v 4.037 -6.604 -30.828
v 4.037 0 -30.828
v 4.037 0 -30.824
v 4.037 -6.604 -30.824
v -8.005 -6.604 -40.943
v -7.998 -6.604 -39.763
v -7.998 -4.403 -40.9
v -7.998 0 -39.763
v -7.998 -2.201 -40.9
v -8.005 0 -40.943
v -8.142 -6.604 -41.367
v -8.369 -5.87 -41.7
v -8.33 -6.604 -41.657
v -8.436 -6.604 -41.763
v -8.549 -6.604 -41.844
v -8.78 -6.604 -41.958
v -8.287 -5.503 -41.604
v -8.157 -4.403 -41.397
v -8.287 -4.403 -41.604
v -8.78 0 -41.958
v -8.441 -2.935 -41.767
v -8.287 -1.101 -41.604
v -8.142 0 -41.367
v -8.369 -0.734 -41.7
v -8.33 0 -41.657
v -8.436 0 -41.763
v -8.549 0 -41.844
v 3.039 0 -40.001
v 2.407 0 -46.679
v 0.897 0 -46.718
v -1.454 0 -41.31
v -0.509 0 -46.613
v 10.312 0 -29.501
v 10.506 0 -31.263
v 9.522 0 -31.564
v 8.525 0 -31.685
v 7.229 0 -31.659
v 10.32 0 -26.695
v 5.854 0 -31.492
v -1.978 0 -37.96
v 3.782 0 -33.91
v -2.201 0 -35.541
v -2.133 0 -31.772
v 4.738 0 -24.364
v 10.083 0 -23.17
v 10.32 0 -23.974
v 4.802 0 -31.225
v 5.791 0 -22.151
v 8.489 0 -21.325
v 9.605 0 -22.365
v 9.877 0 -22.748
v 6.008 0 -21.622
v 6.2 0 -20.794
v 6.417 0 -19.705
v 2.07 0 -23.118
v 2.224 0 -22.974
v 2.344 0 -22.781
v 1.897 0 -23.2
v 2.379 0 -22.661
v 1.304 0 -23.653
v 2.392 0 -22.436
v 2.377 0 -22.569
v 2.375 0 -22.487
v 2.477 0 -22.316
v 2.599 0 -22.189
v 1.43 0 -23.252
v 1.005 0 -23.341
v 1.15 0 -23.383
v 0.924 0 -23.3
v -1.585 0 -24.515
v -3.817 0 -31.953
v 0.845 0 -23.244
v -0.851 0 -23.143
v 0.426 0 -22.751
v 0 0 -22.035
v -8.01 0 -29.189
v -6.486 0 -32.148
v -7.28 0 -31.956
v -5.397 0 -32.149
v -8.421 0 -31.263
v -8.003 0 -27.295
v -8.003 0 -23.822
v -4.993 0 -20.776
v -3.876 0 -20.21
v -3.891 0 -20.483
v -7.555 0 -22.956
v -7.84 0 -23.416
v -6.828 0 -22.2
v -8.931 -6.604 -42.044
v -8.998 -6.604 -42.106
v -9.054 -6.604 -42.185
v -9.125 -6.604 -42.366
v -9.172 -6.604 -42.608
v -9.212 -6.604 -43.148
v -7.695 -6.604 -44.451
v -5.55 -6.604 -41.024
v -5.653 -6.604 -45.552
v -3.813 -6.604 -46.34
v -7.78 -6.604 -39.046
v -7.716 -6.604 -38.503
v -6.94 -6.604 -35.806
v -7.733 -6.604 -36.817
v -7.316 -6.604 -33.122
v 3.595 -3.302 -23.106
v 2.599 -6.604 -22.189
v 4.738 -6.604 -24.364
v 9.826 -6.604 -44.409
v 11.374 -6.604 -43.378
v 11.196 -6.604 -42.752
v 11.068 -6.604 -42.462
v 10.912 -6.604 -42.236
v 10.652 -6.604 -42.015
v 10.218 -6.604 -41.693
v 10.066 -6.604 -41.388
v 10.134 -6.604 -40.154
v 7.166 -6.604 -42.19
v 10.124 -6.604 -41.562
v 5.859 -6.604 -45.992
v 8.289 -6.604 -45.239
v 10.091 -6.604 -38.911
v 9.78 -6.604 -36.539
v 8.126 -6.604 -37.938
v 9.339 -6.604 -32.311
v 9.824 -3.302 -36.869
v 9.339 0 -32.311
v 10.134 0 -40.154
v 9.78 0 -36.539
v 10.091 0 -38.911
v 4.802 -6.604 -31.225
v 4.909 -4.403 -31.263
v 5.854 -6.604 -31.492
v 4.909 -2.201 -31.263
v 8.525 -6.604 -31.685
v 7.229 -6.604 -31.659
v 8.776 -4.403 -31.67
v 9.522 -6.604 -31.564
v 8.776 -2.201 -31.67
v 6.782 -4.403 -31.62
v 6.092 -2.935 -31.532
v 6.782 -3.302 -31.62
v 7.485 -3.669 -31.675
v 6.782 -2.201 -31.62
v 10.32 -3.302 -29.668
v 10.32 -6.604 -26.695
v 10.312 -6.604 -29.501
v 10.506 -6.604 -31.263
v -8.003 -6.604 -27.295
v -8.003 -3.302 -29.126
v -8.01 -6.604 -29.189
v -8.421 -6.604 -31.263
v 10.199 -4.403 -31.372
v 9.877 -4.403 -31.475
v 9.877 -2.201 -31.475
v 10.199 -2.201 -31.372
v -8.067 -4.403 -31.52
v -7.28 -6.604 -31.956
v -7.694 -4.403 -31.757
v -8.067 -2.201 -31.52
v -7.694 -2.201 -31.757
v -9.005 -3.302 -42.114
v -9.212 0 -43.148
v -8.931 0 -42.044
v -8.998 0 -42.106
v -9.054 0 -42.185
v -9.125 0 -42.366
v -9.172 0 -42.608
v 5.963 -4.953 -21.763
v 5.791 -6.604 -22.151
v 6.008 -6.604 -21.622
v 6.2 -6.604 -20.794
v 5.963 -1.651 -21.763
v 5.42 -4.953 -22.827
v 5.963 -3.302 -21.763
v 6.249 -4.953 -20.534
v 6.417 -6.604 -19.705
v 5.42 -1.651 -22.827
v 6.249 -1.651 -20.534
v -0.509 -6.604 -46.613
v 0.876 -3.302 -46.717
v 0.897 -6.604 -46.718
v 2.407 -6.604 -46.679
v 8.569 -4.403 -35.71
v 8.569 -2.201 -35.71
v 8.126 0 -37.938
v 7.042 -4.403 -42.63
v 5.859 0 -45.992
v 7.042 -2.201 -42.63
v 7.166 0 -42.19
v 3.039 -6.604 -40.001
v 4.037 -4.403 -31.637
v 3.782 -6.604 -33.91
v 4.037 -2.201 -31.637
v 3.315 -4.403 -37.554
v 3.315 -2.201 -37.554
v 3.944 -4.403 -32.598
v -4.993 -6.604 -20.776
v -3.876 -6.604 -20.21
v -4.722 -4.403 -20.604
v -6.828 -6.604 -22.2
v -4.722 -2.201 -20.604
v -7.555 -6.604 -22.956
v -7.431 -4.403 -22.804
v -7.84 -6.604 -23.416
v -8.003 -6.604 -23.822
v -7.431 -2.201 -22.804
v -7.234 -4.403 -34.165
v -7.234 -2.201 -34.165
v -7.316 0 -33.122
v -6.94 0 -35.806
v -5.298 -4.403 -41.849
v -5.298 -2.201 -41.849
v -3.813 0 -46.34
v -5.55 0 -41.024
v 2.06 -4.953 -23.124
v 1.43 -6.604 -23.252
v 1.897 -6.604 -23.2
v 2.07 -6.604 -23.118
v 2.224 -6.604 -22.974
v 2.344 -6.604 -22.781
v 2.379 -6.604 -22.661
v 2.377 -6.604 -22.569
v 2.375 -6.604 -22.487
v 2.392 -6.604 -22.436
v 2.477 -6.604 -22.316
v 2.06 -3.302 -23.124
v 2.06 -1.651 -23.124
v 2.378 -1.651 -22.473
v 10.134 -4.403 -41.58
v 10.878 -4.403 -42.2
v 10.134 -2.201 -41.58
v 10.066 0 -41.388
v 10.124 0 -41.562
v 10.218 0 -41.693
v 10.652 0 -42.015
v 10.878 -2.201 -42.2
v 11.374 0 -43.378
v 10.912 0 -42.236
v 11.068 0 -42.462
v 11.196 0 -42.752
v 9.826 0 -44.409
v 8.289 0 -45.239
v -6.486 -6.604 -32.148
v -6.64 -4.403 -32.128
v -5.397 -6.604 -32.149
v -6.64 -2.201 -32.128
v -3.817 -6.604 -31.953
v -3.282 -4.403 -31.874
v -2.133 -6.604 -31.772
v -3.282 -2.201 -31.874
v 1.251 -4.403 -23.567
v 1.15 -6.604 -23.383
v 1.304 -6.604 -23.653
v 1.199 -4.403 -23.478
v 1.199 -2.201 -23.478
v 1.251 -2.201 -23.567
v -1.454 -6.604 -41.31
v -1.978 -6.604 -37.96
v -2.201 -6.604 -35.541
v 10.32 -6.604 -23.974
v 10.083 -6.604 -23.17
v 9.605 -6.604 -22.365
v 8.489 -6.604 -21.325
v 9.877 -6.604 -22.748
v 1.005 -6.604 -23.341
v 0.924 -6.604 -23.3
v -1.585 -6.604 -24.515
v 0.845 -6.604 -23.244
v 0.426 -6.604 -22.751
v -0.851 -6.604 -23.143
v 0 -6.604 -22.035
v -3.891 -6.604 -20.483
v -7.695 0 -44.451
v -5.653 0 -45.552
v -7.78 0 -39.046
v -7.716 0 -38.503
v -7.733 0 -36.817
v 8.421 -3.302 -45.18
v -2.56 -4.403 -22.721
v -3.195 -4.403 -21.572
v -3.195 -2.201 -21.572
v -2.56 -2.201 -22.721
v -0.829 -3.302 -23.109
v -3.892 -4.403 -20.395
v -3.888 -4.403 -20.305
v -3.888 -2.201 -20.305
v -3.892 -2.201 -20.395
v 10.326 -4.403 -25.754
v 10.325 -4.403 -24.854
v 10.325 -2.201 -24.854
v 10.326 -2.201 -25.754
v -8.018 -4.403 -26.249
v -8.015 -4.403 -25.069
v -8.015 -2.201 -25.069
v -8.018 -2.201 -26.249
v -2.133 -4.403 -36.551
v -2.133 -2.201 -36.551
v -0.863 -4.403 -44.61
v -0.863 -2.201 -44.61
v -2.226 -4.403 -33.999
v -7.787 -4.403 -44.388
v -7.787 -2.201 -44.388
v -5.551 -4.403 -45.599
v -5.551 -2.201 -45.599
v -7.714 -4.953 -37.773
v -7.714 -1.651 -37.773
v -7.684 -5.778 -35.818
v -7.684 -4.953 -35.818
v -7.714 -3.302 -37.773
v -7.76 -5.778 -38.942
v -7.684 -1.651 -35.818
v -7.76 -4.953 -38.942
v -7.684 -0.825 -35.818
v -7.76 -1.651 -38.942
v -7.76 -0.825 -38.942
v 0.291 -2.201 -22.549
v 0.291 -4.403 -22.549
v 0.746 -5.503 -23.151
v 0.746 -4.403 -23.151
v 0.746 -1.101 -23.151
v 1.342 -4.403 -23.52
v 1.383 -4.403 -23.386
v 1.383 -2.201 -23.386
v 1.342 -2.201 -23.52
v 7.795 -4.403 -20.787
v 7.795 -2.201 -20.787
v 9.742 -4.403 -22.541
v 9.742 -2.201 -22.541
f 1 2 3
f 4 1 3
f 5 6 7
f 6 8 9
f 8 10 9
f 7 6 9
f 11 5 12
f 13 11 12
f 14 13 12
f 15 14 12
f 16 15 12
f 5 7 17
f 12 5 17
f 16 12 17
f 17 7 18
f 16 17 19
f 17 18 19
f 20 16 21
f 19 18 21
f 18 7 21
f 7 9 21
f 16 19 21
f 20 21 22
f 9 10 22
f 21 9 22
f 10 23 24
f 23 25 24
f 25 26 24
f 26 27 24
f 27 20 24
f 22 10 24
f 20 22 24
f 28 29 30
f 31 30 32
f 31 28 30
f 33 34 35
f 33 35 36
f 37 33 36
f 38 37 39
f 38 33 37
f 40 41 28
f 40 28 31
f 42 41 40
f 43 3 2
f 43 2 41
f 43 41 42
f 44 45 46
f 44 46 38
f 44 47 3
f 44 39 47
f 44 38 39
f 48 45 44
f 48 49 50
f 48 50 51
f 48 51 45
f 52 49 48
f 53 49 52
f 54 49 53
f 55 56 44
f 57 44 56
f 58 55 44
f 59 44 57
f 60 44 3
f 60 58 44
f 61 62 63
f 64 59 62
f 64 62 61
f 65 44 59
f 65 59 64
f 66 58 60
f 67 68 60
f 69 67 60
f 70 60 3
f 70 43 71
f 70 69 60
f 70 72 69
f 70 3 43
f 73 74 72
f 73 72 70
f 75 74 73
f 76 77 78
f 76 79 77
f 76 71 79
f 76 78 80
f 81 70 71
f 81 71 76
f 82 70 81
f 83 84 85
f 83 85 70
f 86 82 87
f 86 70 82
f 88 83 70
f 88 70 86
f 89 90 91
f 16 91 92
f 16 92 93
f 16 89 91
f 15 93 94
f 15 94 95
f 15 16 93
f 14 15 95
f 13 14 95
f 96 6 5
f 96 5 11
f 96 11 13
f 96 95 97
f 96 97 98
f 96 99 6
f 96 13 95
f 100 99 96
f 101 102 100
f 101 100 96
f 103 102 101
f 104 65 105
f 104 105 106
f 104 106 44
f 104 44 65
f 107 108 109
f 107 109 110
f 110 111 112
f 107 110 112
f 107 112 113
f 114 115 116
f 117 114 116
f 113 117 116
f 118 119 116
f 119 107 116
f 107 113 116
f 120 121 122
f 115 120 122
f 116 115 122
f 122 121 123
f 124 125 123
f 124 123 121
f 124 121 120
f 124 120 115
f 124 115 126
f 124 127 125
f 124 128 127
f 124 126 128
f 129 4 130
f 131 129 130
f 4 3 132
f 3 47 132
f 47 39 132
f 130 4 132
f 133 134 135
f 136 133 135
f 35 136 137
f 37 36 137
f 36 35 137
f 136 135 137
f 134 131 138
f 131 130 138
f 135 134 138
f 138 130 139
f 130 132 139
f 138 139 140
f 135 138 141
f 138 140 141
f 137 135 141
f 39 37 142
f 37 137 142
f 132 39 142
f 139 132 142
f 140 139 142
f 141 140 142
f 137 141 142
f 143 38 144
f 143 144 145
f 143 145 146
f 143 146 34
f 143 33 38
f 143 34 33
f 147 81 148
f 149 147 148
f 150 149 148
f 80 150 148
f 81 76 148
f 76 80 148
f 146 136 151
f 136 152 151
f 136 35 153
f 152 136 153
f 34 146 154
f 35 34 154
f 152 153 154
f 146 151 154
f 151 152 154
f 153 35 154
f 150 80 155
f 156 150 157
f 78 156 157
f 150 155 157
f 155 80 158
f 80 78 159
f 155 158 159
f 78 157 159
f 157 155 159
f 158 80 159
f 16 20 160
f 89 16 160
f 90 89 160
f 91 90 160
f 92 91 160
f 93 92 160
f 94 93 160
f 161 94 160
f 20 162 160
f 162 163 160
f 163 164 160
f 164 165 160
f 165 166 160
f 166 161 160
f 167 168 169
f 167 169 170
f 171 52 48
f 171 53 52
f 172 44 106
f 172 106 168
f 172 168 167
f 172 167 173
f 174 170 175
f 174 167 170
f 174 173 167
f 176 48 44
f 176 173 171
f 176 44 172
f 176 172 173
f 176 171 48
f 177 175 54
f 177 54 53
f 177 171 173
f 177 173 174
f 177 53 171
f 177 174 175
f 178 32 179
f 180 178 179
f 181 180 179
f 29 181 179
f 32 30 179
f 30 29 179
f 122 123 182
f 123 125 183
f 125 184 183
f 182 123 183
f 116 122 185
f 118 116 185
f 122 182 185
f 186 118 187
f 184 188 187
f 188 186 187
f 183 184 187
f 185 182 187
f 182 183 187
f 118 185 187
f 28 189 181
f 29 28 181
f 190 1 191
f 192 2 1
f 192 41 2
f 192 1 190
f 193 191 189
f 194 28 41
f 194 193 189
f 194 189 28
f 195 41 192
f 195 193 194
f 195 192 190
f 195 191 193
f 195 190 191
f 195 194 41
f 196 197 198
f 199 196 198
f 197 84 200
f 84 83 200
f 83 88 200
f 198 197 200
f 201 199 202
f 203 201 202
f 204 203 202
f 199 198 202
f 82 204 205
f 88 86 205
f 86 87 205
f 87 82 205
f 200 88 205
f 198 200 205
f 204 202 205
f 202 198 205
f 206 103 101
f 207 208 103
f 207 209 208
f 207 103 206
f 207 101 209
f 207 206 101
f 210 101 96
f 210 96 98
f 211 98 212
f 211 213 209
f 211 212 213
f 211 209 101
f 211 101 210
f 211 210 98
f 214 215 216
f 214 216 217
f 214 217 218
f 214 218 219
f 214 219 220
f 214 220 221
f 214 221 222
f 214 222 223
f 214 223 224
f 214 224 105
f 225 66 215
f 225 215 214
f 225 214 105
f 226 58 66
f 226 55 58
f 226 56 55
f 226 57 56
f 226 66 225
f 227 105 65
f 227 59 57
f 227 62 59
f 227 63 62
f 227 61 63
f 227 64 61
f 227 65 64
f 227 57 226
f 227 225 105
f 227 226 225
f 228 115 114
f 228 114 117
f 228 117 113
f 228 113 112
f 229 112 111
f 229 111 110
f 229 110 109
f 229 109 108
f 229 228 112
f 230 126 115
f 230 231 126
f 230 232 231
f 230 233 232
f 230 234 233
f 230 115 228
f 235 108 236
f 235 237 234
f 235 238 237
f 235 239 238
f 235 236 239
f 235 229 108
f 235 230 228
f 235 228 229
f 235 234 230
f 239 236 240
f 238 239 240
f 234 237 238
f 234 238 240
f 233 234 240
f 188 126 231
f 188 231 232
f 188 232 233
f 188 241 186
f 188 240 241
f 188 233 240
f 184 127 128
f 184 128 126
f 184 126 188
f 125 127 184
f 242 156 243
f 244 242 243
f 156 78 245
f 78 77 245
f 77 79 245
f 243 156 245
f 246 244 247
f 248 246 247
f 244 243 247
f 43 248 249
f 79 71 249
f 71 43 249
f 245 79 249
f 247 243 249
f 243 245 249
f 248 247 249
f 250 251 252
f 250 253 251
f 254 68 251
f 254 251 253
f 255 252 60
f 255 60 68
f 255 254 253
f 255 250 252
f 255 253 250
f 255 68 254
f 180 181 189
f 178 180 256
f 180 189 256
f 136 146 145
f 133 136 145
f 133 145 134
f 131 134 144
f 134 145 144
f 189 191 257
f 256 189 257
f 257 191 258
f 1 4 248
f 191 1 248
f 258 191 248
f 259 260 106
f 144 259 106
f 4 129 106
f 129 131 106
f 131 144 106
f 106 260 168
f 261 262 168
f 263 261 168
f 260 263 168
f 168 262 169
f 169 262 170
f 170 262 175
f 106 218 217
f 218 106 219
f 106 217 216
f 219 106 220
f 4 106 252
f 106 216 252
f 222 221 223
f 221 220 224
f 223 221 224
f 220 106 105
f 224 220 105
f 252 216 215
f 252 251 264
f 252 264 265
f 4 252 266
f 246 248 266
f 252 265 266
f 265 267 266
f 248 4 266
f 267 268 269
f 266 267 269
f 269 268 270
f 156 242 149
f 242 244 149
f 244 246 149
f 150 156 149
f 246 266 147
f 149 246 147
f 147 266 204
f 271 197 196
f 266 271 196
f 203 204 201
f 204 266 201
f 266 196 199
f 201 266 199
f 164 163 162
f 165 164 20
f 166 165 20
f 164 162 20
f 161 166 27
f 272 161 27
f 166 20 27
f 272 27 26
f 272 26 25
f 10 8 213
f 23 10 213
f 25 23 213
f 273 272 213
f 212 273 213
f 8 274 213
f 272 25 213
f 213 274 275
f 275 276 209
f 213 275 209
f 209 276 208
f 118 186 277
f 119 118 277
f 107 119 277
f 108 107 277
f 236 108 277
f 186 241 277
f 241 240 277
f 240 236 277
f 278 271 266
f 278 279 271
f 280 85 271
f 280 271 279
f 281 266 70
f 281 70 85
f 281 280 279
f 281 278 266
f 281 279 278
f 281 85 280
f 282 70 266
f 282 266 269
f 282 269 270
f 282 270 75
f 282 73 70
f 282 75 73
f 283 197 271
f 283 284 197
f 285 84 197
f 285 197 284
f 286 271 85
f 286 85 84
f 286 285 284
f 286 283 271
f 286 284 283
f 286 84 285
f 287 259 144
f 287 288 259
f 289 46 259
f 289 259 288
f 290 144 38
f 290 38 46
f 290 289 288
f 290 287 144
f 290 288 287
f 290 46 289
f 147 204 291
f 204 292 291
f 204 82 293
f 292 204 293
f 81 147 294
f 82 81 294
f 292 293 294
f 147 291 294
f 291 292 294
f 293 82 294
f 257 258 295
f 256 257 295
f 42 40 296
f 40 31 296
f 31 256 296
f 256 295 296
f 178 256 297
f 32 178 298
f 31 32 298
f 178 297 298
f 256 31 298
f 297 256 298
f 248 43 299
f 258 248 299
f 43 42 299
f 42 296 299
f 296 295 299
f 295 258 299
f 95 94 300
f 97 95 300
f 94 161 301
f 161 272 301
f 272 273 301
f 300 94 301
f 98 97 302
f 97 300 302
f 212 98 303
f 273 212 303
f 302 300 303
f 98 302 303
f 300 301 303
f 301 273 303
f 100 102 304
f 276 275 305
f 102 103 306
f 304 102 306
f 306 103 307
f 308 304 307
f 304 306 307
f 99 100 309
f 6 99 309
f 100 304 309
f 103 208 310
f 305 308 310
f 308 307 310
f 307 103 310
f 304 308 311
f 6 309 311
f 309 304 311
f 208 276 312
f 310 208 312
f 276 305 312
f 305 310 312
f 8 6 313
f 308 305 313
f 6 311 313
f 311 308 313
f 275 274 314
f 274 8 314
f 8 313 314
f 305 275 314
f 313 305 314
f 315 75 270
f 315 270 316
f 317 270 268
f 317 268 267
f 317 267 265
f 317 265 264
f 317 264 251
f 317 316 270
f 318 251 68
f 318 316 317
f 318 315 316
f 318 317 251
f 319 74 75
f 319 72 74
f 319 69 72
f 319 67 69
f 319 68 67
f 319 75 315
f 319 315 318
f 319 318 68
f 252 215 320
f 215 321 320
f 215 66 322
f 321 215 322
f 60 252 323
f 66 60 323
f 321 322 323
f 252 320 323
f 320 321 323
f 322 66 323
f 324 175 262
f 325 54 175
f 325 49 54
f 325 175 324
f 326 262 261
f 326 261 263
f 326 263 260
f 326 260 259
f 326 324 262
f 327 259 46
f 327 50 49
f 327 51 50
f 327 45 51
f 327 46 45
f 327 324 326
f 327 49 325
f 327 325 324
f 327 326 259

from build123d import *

# Parameters (mm, degrees)
F1_DEPTH = 6.604


with BuildPart() as f1:
    # F0 (on Front) → F1 (new body)
    with BuildSketch(Plane.XZ):
        with BuildLine():
            add(Edge.make_bspline(
                [(1.1497032875, -23.3825250299), (1.196561232, -23.482640341), (1.2503133009, -23.5679166675), (1.3041357743, -23.6533004791)],
                knots=[0.9300041209, 0.9300041209, 0.9300041209, 0.9300041209, 1, 1, 1, 1], degree=3))
            add(Edge.make_bspline(
                [(0, -22.0348257571), (0.0812285979, -22.1912839001), (0.2631810605, -22.5423085387), (0.8188425061, -23.3060281912), (1.0602767296, -23.3623532218), (1.1497032875, -23.3825250299)],
                knots=[0, 0, 0, 0, 0.3369494365, 0.7561140095, 1, 1, 1, 1], degree=3))
            add(Edge.make_bspline(
                [(-1.5849161427, -24.5154779404), (-1.345206038, -24.0256383181), (-0.884584287, -23.0843730979), (-0.2867283861, -22.3750251249), (0, -22.0348257571)],
                knots=[0, 0, 0, 0, 0.5204055264, 1, 1, 1, 1], degree=3))
            add(Edge.make_bspline(
                [(-3.8910638541, -20.4827003181), (-3.6505175345, -20.8468328503), (-3.1674718148, -21.5780544355), (-2.5515288628, -22.7451588248), (-1.9298877508, -23.8836738897), (-1.5849161427, -24.5154779404)],
                knots=[0, 0, 0, 0, 0.3062678611, 0.6150224191, 1, 1, 1, 1], degree=3))
            add(Edge.make_bspline(
                [(-3.8755044345, -20.2104461632), (-3.8944603794, -20.30795767), (-3.8927621167, -20.3953289941), (-3.8910638541, -20.4827003181)],
                knots=[0.8433644561, 0.8433644561, 0.8433644561, 0.8433644561, 1, 1, 1, 1], degree=3))
            add(Edge.make_bspline(
                [(-3.8755044345, -20.2104461632), (-4.1044836782, -20.2897716629), (-4.7764963733, -20.5224047591), (-7.5966979576, -22.691586935), (-7.8942564645, -23.5186829688), (-8.0032804981, -23.8217506558)],
                knots=[0, 0, 0, 0, 0.2467581374, 0.7239895384, 1, 1, 1, 1], degree=3))
            add(Edge.make_bspline(
                [(-8.0032804981, -23.8217506558), (-8.0161008013, -25.0803462224), (-8.0289211045, -26.3389417891), (-8.0032804981, -27.2946506739)],
                knots=[0, 0, 0, 0, 0.3971402404, 0.3971402404, 0.3971402404, 0.3971402404], degree=3))
            add(Edge.make_bspline(
                [(-8.0032804981, -27.2946506739), (-7.9846598182, -27.9887040412), (-7.9033379715, -29.1055696173), (-8.2433465749, -30.5234976757), (-8.4206936881, -31.2630832195)],
                knots=[0.3971402404, 0.3971402404, 0.3971402404, 0.3971402404, 0.6855507862, 1, 1, 1, 1], degree=3))
            add(Edge.make_bspline(
                [(-8.4206936881, -31.2630832195), (-8.0707479073, -31.5229253729), (-7.7208021265, -31.7827675263), (-7.280498254, -31.9563828779)],
                knots=[0, 0, 0, 0, 0.2264662718, 0.2264662718, 0.2264662718, 0.2264662718], degree=3))
            add(Edge.make_bspline(
                [(-7.280498254, -31.9563828779), (-7.087001058, -32.0326803756), (-5.9748657581, -32.3471325273), (-3.3059866082, -31.8284608794), (-2.4493561435, -31.7871199179), (-2.1330976353, -31.7718572915)],
                knots=[0.2264662718, 0.2264662718, 0.2264662718, 0.2264662718, 0.3259897858, 0.7511628717, 1, 1, 1, 1], degree=3))
            add(Edge.make_bspline(
                [(-2.1330976353, -31.7718572915), (-2.2152386976, -33.2202060273), (-2.404694986, -36.5607858579), (-1.086099516, -43.2058424148), (-0.6236220742, -46.0203927281), (-0.5086617392, -46.6130788646)],
                knots=[0, 0, 0, 0, 0.2604019918, 0.6006106265, 0.706181104, 0.706181104, 0.706181104, 0.706181104], degree=3))
            add(Edge.make_bspline(
                [(-0.5086617392, -46.6130788646), (-0.054032576, -46.6595245839), (0.8828265858, -46.7535402431), (1.8873066503, -46.7039721098), (2.4071369795, -46.6789720867)],
                knots=[0, 0, 0, 0, 0.4877338937, 1, 1, 1, 1], degree=3))
            add(Edge.make_bspline(
                [(4.0371152572, -30.8283232152), (4.0498449975, -31.0367026744), (4.0973883752, -31.822476947), (3.2058039921, -37.8111831479), (2.6809233611, -43.5650242157), (2.4071369795, -46.6789720867)],
                knots=[0, 0, 0, 0, 0.1368819039, 0.5084777049, 0.9418583296, 0.9418583296, 0.9418583296, 0.9418583296], degree=3))
            Line((4.0371152572, -30.8283232152), (4.0371152572, -30.8240728969))
            add(Edge.make_bspline(
                [(4.0371152572, -30.8240728969), (4.2589618279, -30.9802818339), (5.1811653861, -31.5199314213), (8.0797833825, -31.7977979949), (9.3025548706, -31.6116050516), (9.5219962154, -31.5644456762)],
                knots=[0.0837609161, 0.0837609161, 0.0837609161, 0.0837609161, 0.2597027552, 0.7013911773, 0.8114710435, 0.8114710435, 0.8114710435, 0.8114710435], degree=3))
            add(Edge.make_bspline(
                [(9.5219962154, -31.5644456762), (9.8978237774, -31.4836778834), (10.2017699607, -31.3735395299), (10.5056809261, -31.2630832195)],
                knots=[0.8114710435, 0.8114710435, 0.8114710435, 0.8114710435, 1, 1, 1, 1], degree=3))
            add(Edge.make_bspline(
                [(10.3195011616, -26.6950372607), (10.3066542553, -27.7065685869), (10.2494190203, -29.633979984), (10.4294326417, -30.7783590992), (10.5056809261, -31.2630832195)],
                knots=[0.3554197548, 0.3554197548, 0.3554197548, 0.3554197548, 0.7269754506, 1, 1, 1, 1], degree=3))
            add(Edge.make_bspline(
                [(10.3195011616, -23.9742975682), (10.3256456566, -24.85086617), (10.3317901517, -25.7274347717), (10.3195011616, -26.6950372607)],
                knots=[0, 0, 0, 0, 0.3554197548, 0.3554197548, 0.3554197548, 0.3554197548], degree=3))
            add(Edge.make_bspline(
                [(6.4166993834, -19.7054333985), (6.8364474582, -20.0393778353), (7.7694911507, -20.7816915448), (9.935813667, -22.397975898), (10.2033102199, -23.4969447699), (10.3195011616, -23.9742975682)],
                knots=[0, 0, 0, 0, 0.3162623511, 0.7030088036, 1, 1, 1, 1], degree=3))
            add(Edge.make_bspline(
                [(4.7377212904, -24.3642199785), (5.0125045057, -23.7142148821), (5.4828901449, -22.6015084073), (6.0299034698, -21.8474010812), (6.2844083992, -20.2859091691), (6.3800357867, -19.8663085307), (6.4166993834, -19.7054333985)],
                knots=[0, 0, 0, 0, 0.3165942296, 0.5419595187, 0.8243870093, 1, 1, 1, 1], degree=3))
            add(Edge.make_bspline(
                [(2.5988076228, -22.189414897), (2.7361246365, -22.295582924), (3.3578125101, -22.8085256738), (4.1367803168, -23.6867158312), (4.7377212904, -24.3642199785)],
                knots=[0.2395642068, 0.2395642068, 0.2395642068, 0.2395642068, 0.4133489808, 1, 1, 1, 1], degree=3))
            add(Edge.make_bspline(
                [(1.4297665819, -23.2515854994), (1.6534331143, -23.2464180484), (2.088646245, -23.2390077858), (2.4357932634, -22.6803101913), (2.3252870905, -22.463073339), (2.4994670561, -22.2887120699), (2.5988076228, -22.189414897)],
                knots=[0, 0, 0, 0, 0.3097586197, 0.5971540451, 0.7683900023, 1, 1, 1, 1], degree=3))
            add(Edge.make_bspline(
                [(1.4297665819, -23.2515854994), (1.3796401747, -23.3870862304), (1.3419128982, -23.5201049192), (1.3041357743, -23.6533004791)],
                knots=[0.9282044138, 0.9282044138, 0.9282044138, 0.9282044138, 1, 1, 1, 1], degree=3))
        make_face()
    extrude(amount=F1_DEPTH)


with BuildPart() as f1b:
    # F0 (on Front) → F1, piece 2 (new body)
    with BuildSketch(Plane.XZ):
        with BuildLine():
            add(Edge.make_bspline(
                [(10.1339444518, -40.154248476), (10.0996639819, -40.7595654129), (9.8411530369, -41.6907227375), (11.0543259011, -42.0915419673), (11.2624864317, -42.9296879458), (11.3736968488, -43.3776080608)],
                knots=[0.5446663302, 0.5446663302, 0.5446663302, 0.5446663302, 0.7089961818, 0.8444214804, 1, 1, 1, 1], degree=3))
            add(Edge.make_bspline(
                [(9.3393335359, -32.3106409743), (9.4767181896, -33.8676215858), (9.7579545685, -36.7487762852), (10.1860978484, -39.2333353621), (10.1339444518, -40.154248476)],
                knots=[0, 0, 0, 0, 0.2946592576, 0.5446663302, 0.5446663302, 0.5446663302, 0.5446663302], degree=3))
            add(Edge.make_bspline(
                [(9.3393335359, -32.3106409743), (9.0872733652, -33.3458491846), (8.4262549778, -36.1480824729), (7.451926237, -41.7759811318), (6.288470048, -44.9337334805), (5.8590061813, -45.9915856041)],
                knots=[0.0560073572, 0.0560073572, 0.0560073572, 0.0560073572, 0.2875945583, 0.6587580201, 0.8573744911, 0.8573744911, 0.8573744911, 0.8573744911], degree=3))
            add(Edge.make_bspline(
                [(5.8590061813, -45.9915856041), (6.7100418746, -45.7820195896), (8.5255268002, -45.3337985815), (10.3852467136, -44.0566964405), (11.3736968488, -43.3776080608)],
                knots=[0, 0, 0, 0, 0.4684525518, 1, 1, 1, 1], degree=3))
        make_face()
    extrude(amount=F1_DEPTH)


with BuildPart() as f1c:
    # F0 (on Front) → F1, piece 3 (new body)
    with BuildSketch(Plane.XZ):
        with BuildLine():
            add(Edge.make_bspline(
                [(-7.9977270216, -39.7629626095), (-8.0353307006, -40.0740104755), (-7.8475440667, -40.9081566011), (-8.3276784339, -41.7721797654), (-8.6865222436, -41.9133952547), (-8.7804137356, -41.9576022874)],
                knots=[0.5630225378, 0.5630225378, 0.5630225378, 0.5630225378, 0.6829954373, 0.7971342168, 0.8427017499, 0.8427017499, 0.8427017499, 0.8427017499], degree=3))
            add(Edge.make_bspline(
                [(-8.7804137356, -41.9576022874), (-8.8665040184, -41.9981362684), (-9.1637303886, -42.1631307164), (-9.1916198941, -42.7308055441), (-9.2121018097, -43.1477054954)],
                knots=[0.8427017499, 0.8427017499, 0.8427017499, 0.8427017499, 0.8844831907, 1, 1, 1, 1], degree=3))
            add(Edge.make_bspline(
                [(-9.2121018097, -43.1477054954), (-8.7804137356, -43.5718730282), (-7.8596034967, -44.4858982699), (-5.5490503509, -45.6196405109), (-4.3826465365, -46.1250309413), (-3.8132368899, -46.3399066668)],
                knots=[0, 0, 0, 0, 0.3164912874, 0.6835755444, 1, 1, 1, 1], degree=3))
            add(Edge.make_bspline(
                [(-7.3158233845, -33.1216985999), (-7.3086622948, -33.427565943), (-7.1773727045, -35.3237923438), (-5.7271713877, -40.6773066803), (-4.3193262788, -44.8829977144), (-3.8132368899, -46.3399066668)],
                knots=[0.1190063712, 0.1190063712, 0.1190063712, 0.1190063712, 0.2028887758, 0.5871633563, 0.7972885103, 0.7972885103, 0.7972885103, 0.7972885103], degree=3))
            add(Edge.make_bspline(
                [(-7.3158233845, -33.1216985999), (-7.4900971647, -34.2370580513), (-7.7847418523, -36.1476930372), (-7.7029307491, -37.6897389964), (-7.7019333382, -39.1092609266), (-7.9681596635, -39.5183891031), (-7.9977270216, -39.7629626095)],
                knots=[0, 0, 0, 0, 0.1981522726, 0.3394131379, 0.4686891701, 0.5630225378, 0.5630225378, 0.5630225378, 0.5630225378], degree=3))
        make_face()
    extrude(amount=F1_DEPTH)


solid = Compound([f1.part, f1b.part, f1c.part])
